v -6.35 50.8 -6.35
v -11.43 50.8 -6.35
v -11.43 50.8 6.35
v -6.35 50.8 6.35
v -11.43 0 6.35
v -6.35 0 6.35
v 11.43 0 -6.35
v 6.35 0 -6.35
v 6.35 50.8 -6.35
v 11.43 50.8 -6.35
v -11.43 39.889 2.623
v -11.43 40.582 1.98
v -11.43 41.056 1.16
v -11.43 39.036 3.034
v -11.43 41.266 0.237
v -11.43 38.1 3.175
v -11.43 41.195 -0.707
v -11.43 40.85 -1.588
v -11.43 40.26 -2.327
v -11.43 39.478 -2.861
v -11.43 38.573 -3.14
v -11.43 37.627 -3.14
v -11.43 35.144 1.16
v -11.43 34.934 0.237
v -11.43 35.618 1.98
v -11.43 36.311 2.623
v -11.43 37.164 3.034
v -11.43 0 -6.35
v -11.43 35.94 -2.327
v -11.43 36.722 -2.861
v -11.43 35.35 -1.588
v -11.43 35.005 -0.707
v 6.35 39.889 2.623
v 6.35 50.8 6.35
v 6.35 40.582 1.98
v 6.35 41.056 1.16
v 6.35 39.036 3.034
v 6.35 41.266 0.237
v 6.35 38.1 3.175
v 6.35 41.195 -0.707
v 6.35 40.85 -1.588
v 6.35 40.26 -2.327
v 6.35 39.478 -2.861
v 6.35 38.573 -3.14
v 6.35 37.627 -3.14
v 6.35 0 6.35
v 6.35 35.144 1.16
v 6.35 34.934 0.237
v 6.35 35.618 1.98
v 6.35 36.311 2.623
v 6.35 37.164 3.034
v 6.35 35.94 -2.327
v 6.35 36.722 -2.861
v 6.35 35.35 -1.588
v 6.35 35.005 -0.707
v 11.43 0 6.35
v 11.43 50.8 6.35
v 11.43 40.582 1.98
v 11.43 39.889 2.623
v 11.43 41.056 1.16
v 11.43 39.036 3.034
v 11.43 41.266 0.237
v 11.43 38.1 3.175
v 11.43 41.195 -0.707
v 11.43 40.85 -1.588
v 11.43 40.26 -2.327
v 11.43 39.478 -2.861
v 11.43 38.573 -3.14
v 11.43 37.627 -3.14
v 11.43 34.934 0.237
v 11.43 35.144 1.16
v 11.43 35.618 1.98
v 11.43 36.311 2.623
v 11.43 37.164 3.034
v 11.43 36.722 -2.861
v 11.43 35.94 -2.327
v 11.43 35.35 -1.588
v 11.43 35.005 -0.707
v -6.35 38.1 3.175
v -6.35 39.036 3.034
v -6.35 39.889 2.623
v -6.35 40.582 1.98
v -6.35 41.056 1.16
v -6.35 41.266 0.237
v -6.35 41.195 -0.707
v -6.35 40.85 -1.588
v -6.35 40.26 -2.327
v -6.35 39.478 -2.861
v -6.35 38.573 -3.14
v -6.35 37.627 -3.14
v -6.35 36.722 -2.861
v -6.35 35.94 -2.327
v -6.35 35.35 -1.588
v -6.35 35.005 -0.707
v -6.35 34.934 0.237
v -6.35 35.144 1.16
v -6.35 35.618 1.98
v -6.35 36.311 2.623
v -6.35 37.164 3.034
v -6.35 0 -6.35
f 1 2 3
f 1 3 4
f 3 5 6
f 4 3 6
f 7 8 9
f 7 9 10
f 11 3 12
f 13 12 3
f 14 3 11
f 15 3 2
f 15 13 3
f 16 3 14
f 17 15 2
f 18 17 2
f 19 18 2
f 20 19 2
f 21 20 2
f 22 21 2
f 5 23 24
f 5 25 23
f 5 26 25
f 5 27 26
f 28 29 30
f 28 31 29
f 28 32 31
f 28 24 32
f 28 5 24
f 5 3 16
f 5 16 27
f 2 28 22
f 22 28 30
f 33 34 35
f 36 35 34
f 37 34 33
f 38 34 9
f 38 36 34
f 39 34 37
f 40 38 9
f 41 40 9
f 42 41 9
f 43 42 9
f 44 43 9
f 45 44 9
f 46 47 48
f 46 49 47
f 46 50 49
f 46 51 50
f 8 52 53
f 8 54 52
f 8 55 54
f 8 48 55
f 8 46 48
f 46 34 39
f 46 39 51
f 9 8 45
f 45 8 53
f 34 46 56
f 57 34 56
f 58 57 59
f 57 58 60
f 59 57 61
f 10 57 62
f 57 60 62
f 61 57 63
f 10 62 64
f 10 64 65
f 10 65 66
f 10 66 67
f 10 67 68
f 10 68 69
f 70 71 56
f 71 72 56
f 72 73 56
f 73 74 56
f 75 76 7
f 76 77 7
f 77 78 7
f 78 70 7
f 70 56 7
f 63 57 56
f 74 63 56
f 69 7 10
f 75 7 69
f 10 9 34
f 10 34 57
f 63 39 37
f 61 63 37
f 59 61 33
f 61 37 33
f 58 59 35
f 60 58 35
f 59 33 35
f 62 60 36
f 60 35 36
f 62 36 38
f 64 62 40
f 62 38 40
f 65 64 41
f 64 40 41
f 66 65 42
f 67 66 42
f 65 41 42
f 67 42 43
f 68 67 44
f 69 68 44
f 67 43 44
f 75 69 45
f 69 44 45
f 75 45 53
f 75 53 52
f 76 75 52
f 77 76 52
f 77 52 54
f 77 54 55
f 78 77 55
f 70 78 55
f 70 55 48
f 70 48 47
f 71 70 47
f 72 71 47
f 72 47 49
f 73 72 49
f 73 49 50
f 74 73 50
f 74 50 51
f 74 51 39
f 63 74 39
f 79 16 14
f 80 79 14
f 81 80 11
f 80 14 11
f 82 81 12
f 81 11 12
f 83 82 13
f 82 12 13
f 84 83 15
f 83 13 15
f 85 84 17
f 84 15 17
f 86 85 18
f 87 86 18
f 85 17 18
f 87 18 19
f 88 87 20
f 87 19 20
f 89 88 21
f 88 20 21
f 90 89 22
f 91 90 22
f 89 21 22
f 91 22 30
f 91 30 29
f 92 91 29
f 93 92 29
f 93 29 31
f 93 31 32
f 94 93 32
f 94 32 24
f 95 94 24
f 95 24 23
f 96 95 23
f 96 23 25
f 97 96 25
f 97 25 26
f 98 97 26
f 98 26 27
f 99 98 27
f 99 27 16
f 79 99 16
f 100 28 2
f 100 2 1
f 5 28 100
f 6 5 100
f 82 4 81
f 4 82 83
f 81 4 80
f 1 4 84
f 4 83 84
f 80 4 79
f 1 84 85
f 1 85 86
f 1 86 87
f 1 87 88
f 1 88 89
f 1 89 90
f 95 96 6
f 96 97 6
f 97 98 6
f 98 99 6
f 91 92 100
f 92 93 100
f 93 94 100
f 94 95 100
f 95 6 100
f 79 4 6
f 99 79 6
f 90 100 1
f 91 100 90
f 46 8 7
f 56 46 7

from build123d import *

# Parameters (mm, degrees)
SKETCH1_W             = 5.08
SKETCH1_H             = 12.7
BOSS_EXTRUDE1_DEPTH   = 50.8
BOSS_EXTRUDE1_2_DEPTH = 50.8
SKETCH2_R             = 3.175
CUT_EXTRUDE1_DEPTH    = 23.86


with BuildPart() as part:
    # Sketch1 → Boss-Extrude1 (new body)
    with BuildSketch(Plane(origin=(0, 0, 0), x_dir=(1, 0, 0), z_dir=(0, 1, 0))):
        with Locations((-8.89, 0)):
            Rectangle(SKETCH1_W, SKETCH1_H)
    extrude(amount=BOSS_EXTRUDE1_DEPTH)


with BuildPart() as body_2:
    # Sketch1 → Boss-Extrude1 2 (new body)
    with BuildSketch(Plane(origin=(0, 0, 0), x_dir=(1, 0, 0), z_dir=(0, 1, 0))):
        with Locations((8.89, 0)):
            Rectangle(SKETCH1_W, SKETCH1_H)
    extrude(amount=BOSS_EXTRUDE1_2_DEPTH)


with BuildPart() as cut_extrude1_tool:
    # Sketch2 → Cut-Extrude1 (new body, through all)
    with BuildSketch(Plane.ZY.offset(11.43)):
        with Locations((0, 38.1)):
            Circle(SKETCH2_R)
    extrude(amount=-CUT_EXTRUDE1_DEPTH)


with BuildPart() as part_1:
    add(part.part)

    # Cut-Extrude1: cut by cut_extrude1_tool
    add(cut_extrude1_tool.part, mode=Mode.SUBTRACT)


with BuildPart() as body_2_1:
    add(body_2.part)

    # Cut-Extrude1: cut by cut_extrude1_tool
    add(cut_extrude1_tool.part, mode=Mode.SUBTRACT)


solid = Compound([part_1.part, body_2_1.part])
